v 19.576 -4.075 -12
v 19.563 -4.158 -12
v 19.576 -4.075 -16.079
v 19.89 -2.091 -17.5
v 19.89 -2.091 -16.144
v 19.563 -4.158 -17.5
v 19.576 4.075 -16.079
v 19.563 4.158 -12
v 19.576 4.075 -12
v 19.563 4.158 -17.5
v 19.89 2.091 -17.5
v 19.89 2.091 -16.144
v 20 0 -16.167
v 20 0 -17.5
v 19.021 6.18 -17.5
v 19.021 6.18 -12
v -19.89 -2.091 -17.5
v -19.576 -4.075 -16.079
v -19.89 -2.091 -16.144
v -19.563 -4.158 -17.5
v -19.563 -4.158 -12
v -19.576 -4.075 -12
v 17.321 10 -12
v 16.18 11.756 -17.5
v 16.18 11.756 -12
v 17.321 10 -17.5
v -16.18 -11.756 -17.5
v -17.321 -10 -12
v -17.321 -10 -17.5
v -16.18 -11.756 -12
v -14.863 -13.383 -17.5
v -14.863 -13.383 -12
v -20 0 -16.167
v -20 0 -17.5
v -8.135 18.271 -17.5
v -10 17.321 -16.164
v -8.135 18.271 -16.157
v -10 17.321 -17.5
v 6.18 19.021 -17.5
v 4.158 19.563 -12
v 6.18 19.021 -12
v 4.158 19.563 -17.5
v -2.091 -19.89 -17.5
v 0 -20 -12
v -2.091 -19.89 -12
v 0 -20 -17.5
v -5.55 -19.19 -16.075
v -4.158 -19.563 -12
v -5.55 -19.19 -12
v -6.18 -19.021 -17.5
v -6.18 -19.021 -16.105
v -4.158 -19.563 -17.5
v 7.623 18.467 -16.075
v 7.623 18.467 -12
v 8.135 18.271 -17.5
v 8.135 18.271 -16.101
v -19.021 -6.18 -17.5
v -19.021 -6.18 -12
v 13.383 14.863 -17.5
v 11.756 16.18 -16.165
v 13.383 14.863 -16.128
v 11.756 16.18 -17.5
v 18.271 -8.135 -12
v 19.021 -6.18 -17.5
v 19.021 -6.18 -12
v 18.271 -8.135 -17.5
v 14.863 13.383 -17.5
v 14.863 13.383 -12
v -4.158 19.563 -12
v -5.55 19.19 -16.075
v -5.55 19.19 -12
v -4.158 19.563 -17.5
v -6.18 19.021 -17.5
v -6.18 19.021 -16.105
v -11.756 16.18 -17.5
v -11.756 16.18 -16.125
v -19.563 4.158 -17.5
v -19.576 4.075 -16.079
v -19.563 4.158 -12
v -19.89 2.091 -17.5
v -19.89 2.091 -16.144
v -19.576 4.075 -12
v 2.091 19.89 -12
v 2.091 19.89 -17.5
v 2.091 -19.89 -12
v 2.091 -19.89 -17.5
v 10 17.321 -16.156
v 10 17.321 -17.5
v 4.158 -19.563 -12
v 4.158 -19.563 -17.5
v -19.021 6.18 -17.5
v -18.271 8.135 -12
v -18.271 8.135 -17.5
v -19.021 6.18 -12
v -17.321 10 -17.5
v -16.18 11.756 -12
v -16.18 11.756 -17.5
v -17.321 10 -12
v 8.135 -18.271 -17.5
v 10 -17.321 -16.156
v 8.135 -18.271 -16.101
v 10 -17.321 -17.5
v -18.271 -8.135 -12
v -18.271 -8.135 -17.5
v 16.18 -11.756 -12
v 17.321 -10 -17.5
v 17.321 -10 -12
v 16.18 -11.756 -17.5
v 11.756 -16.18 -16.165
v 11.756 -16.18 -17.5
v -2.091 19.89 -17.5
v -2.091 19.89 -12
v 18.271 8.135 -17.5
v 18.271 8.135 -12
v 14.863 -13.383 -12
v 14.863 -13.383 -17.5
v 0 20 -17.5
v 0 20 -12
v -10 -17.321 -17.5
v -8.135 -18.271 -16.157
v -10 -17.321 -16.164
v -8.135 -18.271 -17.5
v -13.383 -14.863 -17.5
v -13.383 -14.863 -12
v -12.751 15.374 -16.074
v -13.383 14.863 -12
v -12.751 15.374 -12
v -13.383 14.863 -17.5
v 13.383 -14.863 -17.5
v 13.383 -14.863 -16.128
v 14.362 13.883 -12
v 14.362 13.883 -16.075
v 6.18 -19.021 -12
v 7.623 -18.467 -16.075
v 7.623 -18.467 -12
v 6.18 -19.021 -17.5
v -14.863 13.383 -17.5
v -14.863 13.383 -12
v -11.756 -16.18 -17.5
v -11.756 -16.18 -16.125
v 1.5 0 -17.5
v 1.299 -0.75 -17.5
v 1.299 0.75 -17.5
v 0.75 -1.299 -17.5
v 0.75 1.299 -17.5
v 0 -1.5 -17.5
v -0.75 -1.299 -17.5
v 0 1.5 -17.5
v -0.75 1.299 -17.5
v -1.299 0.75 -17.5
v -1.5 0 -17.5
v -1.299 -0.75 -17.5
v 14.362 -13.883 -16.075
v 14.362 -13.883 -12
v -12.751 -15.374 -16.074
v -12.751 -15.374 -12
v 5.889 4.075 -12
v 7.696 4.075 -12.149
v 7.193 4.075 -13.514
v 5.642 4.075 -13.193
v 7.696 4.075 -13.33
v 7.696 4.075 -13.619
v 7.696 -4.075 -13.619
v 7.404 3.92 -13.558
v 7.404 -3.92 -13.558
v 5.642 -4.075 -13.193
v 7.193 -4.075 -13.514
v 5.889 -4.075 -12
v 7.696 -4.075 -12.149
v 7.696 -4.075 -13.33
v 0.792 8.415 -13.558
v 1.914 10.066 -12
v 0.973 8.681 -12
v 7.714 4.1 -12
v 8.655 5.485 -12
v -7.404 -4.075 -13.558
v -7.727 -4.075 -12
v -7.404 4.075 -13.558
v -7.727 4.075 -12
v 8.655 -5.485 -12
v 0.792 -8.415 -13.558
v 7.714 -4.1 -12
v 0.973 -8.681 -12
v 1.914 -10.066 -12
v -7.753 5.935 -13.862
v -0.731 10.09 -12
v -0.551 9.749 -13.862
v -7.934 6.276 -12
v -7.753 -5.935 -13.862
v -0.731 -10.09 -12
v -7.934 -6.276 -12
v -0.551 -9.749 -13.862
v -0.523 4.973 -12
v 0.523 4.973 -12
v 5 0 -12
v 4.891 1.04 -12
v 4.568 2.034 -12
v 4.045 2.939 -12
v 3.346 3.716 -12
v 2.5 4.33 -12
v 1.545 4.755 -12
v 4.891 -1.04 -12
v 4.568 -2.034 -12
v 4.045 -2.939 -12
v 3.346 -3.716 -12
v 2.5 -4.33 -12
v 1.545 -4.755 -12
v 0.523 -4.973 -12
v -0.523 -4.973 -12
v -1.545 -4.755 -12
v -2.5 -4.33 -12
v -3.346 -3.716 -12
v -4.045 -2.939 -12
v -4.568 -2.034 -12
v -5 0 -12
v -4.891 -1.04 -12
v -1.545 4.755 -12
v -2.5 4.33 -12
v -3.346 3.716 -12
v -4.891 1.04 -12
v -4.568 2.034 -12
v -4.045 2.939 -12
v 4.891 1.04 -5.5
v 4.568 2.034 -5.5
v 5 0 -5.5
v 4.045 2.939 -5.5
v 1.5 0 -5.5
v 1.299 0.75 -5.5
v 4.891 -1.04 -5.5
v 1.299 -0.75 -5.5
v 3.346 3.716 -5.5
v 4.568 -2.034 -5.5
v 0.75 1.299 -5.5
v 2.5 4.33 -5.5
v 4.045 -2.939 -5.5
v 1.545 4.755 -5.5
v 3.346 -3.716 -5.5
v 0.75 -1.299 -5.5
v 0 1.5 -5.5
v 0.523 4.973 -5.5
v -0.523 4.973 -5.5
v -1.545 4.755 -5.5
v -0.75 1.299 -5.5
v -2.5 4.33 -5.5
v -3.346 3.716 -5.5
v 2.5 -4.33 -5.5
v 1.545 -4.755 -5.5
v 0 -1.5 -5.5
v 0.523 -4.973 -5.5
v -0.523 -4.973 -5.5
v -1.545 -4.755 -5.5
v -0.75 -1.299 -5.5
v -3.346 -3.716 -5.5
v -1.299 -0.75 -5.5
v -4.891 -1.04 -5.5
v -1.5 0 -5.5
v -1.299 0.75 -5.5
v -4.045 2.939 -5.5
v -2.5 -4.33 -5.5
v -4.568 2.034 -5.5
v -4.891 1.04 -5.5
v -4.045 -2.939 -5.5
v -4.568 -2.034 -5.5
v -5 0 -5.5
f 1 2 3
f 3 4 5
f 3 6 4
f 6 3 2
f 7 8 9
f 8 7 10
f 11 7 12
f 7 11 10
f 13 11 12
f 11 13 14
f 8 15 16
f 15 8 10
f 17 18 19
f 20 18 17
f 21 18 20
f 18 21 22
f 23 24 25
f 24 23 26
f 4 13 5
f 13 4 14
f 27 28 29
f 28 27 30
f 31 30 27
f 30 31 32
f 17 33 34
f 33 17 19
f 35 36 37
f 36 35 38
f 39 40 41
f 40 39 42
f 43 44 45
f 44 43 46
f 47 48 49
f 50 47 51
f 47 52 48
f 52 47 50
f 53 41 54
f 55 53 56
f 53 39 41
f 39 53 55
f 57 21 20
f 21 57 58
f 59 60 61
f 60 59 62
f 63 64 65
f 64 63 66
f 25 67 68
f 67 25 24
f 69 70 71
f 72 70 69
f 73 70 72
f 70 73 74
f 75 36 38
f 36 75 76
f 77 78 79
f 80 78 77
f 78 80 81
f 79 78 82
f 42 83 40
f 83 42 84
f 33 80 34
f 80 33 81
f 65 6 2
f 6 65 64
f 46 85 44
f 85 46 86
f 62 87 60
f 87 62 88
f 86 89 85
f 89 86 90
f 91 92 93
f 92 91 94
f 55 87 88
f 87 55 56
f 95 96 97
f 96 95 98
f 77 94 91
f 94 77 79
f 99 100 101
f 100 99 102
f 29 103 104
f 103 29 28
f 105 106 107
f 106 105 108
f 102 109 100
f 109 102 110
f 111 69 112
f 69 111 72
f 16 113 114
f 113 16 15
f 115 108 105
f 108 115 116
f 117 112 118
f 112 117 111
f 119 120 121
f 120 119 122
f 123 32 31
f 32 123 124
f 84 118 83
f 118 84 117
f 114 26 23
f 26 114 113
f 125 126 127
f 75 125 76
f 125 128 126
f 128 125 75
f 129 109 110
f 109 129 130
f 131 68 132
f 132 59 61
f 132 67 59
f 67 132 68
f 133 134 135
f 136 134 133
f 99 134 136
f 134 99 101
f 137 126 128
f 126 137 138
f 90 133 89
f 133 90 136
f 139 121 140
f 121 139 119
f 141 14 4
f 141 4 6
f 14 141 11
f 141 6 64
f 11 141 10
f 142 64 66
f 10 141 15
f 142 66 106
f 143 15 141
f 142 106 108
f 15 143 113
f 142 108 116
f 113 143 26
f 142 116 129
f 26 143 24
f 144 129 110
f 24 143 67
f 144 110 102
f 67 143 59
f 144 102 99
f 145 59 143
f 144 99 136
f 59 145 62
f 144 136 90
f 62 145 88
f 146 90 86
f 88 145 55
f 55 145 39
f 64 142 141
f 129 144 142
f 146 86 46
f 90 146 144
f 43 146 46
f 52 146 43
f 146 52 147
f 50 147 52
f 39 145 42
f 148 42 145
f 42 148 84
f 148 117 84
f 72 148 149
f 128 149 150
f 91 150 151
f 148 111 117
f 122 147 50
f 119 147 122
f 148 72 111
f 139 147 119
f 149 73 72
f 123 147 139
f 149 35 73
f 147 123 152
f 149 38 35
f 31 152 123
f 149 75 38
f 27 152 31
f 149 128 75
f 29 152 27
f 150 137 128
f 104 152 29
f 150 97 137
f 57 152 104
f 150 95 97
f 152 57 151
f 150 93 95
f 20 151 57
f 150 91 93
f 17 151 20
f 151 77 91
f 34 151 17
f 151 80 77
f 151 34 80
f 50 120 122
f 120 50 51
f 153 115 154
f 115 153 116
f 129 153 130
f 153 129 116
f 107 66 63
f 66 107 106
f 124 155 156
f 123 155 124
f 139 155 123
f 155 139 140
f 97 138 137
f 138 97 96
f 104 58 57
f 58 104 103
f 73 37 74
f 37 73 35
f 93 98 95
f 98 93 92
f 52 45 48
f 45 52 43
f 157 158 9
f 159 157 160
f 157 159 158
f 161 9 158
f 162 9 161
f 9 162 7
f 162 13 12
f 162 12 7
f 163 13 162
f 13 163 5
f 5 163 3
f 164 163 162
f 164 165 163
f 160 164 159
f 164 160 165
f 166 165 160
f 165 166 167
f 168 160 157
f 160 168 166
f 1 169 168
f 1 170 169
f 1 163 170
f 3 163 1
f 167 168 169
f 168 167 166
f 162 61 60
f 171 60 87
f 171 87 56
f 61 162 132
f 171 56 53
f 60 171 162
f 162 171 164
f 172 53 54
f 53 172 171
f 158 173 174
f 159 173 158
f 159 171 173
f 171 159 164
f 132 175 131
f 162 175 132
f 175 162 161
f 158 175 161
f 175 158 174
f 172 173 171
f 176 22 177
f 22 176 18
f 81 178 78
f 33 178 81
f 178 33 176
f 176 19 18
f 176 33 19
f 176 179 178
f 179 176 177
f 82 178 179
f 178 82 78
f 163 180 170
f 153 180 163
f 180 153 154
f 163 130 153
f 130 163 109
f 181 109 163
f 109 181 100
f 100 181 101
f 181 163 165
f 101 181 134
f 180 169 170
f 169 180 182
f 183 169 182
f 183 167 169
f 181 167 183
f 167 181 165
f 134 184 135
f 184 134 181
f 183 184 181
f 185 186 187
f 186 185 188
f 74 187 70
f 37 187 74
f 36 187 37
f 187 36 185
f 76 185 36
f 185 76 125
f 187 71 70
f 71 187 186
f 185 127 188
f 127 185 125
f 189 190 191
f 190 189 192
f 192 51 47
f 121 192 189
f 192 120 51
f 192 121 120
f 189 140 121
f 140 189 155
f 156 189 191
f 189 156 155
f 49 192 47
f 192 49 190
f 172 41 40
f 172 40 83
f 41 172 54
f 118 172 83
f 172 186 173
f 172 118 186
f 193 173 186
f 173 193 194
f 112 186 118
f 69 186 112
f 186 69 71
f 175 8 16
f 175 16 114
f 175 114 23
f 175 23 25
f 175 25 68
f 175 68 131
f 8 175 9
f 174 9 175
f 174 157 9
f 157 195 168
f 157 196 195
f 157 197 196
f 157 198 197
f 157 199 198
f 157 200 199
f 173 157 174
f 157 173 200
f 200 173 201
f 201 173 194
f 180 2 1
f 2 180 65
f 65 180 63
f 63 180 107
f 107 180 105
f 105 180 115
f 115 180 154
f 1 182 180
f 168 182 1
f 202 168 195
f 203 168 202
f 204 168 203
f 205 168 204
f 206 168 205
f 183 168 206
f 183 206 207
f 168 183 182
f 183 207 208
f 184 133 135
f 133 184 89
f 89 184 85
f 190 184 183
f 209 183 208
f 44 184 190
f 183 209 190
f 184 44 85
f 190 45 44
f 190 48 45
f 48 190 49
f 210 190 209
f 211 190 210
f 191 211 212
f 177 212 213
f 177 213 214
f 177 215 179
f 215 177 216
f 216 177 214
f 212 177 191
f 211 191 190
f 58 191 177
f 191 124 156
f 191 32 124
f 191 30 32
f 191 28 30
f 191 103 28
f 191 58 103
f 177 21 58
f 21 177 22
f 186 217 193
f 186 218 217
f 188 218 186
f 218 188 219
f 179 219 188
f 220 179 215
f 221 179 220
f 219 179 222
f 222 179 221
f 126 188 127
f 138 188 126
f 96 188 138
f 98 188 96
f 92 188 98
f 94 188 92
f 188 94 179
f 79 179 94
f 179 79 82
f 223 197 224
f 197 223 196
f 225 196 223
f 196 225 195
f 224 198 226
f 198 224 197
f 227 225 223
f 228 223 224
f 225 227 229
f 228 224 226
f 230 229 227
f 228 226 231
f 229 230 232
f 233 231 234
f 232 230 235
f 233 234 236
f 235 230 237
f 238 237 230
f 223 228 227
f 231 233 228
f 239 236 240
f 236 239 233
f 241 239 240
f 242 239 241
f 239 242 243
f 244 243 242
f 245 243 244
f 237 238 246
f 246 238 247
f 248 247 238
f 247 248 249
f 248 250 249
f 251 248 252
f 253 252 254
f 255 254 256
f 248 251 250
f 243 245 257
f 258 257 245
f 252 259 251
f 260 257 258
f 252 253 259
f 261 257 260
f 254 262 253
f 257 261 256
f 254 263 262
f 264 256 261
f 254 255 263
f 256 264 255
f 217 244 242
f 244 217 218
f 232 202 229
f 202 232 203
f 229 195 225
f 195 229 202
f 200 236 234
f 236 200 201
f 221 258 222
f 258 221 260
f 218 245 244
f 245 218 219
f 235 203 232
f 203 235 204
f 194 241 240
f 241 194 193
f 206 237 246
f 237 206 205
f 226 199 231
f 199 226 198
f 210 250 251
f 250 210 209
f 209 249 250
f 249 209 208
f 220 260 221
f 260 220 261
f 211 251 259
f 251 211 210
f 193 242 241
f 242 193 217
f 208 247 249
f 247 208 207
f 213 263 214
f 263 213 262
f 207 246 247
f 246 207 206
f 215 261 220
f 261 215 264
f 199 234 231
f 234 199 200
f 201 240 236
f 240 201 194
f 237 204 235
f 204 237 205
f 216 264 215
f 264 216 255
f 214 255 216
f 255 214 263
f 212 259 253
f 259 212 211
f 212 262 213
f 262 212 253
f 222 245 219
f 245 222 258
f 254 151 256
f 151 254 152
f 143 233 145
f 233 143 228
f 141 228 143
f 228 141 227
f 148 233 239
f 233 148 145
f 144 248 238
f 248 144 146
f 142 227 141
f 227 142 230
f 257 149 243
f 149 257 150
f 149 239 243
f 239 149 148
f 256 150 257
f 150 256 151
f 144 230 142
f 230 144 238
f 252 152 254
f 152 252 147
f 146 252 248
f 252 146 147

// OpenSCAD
offset=-2.5;

difference(){
translate([0,0,offset])
cylinder(d=40,h=30,$fn=60,center=true);
cylinder(d=3.7,h=60,$fn=15,center=true);
rotate([0,0,0])
rotate([0,11.7,0])translate([18.2,0,0])
cube([20,8.15,23.55],center=true);
rotate([0,0,55.8])
rotate([0,11.7,0])translate([20,0,0])
cube([20,8.15,23.55],center=true);
rotate([0,0,180])
rotate([0,11.7,0])translate([20,0,0])
cube([20,8.15,23.55],center=true);
rotate([0,0,-55.8])
rotate([0,11.7,0])translate([20,0,0])
cube([20,8.15,23.55],center=true);
rotate([0,0,55.8+62.1])
rotate([0,11.7,0])translate([21.5,0,0])
cube([20,8.15,23.55],center=true);
rotate([0,0,-55.8-62.1])
rotate([0,11.7,0])translate([21.5,0,0])
cube([20,8.15,23.55],center=true);
translate([0,0,-12])cylinder(d=50,h=30);
}
difference(){
translate([0,0,-17.5])cylinder(d=10,h=12,$fn=30);
cylinder(d=3,h=100,$fn=12,center=true);
}

//difference(){
//translate([0,0,offset])
//cylinder(d=40,h=28,$fn=60,center=true);
//cylinder(d=3.7,h=60,$fn=15,center=true);
//rotate([0,0,0])
//rotate([0,11.7,0])translate([18.2,0,0])
//cube([20,8.15,23.55],center=true);
//rotate([0,0,55.8])
//rotate([0,11.7,0])translate([20,0,0])
//cube([20,8.15,23.55],center=true);
//rotate([0,0,180])
//rotate([0,11.7,0])translate([20,0,0])
//cube([20,8.15,23.55],center=true);
//rotate([0,0,-55.8])
//rotate([0,11.7,0])translate([20,0,0])
//cube([20,8.15,23.55],center=true);
//rotate([0,0,55.8+62.1])
//rotate([0,11.7,0])translate([21.5,0,0])
//cube([20,8.15,23.55],center=true);
//rotate([0,0,-55.8-62.1])
//rotate([0,11.7,0])translate([21.5,0,0])
//cube([20,8.15,23.55],center=true);
//translate([0,0,-23])cylinder(d=50,h=30);
//}

%rotate([0,0,0])
rotate([0,11.7,0])translate([18.2,0,0])
cube([20,8.15,23.55],center=true);
